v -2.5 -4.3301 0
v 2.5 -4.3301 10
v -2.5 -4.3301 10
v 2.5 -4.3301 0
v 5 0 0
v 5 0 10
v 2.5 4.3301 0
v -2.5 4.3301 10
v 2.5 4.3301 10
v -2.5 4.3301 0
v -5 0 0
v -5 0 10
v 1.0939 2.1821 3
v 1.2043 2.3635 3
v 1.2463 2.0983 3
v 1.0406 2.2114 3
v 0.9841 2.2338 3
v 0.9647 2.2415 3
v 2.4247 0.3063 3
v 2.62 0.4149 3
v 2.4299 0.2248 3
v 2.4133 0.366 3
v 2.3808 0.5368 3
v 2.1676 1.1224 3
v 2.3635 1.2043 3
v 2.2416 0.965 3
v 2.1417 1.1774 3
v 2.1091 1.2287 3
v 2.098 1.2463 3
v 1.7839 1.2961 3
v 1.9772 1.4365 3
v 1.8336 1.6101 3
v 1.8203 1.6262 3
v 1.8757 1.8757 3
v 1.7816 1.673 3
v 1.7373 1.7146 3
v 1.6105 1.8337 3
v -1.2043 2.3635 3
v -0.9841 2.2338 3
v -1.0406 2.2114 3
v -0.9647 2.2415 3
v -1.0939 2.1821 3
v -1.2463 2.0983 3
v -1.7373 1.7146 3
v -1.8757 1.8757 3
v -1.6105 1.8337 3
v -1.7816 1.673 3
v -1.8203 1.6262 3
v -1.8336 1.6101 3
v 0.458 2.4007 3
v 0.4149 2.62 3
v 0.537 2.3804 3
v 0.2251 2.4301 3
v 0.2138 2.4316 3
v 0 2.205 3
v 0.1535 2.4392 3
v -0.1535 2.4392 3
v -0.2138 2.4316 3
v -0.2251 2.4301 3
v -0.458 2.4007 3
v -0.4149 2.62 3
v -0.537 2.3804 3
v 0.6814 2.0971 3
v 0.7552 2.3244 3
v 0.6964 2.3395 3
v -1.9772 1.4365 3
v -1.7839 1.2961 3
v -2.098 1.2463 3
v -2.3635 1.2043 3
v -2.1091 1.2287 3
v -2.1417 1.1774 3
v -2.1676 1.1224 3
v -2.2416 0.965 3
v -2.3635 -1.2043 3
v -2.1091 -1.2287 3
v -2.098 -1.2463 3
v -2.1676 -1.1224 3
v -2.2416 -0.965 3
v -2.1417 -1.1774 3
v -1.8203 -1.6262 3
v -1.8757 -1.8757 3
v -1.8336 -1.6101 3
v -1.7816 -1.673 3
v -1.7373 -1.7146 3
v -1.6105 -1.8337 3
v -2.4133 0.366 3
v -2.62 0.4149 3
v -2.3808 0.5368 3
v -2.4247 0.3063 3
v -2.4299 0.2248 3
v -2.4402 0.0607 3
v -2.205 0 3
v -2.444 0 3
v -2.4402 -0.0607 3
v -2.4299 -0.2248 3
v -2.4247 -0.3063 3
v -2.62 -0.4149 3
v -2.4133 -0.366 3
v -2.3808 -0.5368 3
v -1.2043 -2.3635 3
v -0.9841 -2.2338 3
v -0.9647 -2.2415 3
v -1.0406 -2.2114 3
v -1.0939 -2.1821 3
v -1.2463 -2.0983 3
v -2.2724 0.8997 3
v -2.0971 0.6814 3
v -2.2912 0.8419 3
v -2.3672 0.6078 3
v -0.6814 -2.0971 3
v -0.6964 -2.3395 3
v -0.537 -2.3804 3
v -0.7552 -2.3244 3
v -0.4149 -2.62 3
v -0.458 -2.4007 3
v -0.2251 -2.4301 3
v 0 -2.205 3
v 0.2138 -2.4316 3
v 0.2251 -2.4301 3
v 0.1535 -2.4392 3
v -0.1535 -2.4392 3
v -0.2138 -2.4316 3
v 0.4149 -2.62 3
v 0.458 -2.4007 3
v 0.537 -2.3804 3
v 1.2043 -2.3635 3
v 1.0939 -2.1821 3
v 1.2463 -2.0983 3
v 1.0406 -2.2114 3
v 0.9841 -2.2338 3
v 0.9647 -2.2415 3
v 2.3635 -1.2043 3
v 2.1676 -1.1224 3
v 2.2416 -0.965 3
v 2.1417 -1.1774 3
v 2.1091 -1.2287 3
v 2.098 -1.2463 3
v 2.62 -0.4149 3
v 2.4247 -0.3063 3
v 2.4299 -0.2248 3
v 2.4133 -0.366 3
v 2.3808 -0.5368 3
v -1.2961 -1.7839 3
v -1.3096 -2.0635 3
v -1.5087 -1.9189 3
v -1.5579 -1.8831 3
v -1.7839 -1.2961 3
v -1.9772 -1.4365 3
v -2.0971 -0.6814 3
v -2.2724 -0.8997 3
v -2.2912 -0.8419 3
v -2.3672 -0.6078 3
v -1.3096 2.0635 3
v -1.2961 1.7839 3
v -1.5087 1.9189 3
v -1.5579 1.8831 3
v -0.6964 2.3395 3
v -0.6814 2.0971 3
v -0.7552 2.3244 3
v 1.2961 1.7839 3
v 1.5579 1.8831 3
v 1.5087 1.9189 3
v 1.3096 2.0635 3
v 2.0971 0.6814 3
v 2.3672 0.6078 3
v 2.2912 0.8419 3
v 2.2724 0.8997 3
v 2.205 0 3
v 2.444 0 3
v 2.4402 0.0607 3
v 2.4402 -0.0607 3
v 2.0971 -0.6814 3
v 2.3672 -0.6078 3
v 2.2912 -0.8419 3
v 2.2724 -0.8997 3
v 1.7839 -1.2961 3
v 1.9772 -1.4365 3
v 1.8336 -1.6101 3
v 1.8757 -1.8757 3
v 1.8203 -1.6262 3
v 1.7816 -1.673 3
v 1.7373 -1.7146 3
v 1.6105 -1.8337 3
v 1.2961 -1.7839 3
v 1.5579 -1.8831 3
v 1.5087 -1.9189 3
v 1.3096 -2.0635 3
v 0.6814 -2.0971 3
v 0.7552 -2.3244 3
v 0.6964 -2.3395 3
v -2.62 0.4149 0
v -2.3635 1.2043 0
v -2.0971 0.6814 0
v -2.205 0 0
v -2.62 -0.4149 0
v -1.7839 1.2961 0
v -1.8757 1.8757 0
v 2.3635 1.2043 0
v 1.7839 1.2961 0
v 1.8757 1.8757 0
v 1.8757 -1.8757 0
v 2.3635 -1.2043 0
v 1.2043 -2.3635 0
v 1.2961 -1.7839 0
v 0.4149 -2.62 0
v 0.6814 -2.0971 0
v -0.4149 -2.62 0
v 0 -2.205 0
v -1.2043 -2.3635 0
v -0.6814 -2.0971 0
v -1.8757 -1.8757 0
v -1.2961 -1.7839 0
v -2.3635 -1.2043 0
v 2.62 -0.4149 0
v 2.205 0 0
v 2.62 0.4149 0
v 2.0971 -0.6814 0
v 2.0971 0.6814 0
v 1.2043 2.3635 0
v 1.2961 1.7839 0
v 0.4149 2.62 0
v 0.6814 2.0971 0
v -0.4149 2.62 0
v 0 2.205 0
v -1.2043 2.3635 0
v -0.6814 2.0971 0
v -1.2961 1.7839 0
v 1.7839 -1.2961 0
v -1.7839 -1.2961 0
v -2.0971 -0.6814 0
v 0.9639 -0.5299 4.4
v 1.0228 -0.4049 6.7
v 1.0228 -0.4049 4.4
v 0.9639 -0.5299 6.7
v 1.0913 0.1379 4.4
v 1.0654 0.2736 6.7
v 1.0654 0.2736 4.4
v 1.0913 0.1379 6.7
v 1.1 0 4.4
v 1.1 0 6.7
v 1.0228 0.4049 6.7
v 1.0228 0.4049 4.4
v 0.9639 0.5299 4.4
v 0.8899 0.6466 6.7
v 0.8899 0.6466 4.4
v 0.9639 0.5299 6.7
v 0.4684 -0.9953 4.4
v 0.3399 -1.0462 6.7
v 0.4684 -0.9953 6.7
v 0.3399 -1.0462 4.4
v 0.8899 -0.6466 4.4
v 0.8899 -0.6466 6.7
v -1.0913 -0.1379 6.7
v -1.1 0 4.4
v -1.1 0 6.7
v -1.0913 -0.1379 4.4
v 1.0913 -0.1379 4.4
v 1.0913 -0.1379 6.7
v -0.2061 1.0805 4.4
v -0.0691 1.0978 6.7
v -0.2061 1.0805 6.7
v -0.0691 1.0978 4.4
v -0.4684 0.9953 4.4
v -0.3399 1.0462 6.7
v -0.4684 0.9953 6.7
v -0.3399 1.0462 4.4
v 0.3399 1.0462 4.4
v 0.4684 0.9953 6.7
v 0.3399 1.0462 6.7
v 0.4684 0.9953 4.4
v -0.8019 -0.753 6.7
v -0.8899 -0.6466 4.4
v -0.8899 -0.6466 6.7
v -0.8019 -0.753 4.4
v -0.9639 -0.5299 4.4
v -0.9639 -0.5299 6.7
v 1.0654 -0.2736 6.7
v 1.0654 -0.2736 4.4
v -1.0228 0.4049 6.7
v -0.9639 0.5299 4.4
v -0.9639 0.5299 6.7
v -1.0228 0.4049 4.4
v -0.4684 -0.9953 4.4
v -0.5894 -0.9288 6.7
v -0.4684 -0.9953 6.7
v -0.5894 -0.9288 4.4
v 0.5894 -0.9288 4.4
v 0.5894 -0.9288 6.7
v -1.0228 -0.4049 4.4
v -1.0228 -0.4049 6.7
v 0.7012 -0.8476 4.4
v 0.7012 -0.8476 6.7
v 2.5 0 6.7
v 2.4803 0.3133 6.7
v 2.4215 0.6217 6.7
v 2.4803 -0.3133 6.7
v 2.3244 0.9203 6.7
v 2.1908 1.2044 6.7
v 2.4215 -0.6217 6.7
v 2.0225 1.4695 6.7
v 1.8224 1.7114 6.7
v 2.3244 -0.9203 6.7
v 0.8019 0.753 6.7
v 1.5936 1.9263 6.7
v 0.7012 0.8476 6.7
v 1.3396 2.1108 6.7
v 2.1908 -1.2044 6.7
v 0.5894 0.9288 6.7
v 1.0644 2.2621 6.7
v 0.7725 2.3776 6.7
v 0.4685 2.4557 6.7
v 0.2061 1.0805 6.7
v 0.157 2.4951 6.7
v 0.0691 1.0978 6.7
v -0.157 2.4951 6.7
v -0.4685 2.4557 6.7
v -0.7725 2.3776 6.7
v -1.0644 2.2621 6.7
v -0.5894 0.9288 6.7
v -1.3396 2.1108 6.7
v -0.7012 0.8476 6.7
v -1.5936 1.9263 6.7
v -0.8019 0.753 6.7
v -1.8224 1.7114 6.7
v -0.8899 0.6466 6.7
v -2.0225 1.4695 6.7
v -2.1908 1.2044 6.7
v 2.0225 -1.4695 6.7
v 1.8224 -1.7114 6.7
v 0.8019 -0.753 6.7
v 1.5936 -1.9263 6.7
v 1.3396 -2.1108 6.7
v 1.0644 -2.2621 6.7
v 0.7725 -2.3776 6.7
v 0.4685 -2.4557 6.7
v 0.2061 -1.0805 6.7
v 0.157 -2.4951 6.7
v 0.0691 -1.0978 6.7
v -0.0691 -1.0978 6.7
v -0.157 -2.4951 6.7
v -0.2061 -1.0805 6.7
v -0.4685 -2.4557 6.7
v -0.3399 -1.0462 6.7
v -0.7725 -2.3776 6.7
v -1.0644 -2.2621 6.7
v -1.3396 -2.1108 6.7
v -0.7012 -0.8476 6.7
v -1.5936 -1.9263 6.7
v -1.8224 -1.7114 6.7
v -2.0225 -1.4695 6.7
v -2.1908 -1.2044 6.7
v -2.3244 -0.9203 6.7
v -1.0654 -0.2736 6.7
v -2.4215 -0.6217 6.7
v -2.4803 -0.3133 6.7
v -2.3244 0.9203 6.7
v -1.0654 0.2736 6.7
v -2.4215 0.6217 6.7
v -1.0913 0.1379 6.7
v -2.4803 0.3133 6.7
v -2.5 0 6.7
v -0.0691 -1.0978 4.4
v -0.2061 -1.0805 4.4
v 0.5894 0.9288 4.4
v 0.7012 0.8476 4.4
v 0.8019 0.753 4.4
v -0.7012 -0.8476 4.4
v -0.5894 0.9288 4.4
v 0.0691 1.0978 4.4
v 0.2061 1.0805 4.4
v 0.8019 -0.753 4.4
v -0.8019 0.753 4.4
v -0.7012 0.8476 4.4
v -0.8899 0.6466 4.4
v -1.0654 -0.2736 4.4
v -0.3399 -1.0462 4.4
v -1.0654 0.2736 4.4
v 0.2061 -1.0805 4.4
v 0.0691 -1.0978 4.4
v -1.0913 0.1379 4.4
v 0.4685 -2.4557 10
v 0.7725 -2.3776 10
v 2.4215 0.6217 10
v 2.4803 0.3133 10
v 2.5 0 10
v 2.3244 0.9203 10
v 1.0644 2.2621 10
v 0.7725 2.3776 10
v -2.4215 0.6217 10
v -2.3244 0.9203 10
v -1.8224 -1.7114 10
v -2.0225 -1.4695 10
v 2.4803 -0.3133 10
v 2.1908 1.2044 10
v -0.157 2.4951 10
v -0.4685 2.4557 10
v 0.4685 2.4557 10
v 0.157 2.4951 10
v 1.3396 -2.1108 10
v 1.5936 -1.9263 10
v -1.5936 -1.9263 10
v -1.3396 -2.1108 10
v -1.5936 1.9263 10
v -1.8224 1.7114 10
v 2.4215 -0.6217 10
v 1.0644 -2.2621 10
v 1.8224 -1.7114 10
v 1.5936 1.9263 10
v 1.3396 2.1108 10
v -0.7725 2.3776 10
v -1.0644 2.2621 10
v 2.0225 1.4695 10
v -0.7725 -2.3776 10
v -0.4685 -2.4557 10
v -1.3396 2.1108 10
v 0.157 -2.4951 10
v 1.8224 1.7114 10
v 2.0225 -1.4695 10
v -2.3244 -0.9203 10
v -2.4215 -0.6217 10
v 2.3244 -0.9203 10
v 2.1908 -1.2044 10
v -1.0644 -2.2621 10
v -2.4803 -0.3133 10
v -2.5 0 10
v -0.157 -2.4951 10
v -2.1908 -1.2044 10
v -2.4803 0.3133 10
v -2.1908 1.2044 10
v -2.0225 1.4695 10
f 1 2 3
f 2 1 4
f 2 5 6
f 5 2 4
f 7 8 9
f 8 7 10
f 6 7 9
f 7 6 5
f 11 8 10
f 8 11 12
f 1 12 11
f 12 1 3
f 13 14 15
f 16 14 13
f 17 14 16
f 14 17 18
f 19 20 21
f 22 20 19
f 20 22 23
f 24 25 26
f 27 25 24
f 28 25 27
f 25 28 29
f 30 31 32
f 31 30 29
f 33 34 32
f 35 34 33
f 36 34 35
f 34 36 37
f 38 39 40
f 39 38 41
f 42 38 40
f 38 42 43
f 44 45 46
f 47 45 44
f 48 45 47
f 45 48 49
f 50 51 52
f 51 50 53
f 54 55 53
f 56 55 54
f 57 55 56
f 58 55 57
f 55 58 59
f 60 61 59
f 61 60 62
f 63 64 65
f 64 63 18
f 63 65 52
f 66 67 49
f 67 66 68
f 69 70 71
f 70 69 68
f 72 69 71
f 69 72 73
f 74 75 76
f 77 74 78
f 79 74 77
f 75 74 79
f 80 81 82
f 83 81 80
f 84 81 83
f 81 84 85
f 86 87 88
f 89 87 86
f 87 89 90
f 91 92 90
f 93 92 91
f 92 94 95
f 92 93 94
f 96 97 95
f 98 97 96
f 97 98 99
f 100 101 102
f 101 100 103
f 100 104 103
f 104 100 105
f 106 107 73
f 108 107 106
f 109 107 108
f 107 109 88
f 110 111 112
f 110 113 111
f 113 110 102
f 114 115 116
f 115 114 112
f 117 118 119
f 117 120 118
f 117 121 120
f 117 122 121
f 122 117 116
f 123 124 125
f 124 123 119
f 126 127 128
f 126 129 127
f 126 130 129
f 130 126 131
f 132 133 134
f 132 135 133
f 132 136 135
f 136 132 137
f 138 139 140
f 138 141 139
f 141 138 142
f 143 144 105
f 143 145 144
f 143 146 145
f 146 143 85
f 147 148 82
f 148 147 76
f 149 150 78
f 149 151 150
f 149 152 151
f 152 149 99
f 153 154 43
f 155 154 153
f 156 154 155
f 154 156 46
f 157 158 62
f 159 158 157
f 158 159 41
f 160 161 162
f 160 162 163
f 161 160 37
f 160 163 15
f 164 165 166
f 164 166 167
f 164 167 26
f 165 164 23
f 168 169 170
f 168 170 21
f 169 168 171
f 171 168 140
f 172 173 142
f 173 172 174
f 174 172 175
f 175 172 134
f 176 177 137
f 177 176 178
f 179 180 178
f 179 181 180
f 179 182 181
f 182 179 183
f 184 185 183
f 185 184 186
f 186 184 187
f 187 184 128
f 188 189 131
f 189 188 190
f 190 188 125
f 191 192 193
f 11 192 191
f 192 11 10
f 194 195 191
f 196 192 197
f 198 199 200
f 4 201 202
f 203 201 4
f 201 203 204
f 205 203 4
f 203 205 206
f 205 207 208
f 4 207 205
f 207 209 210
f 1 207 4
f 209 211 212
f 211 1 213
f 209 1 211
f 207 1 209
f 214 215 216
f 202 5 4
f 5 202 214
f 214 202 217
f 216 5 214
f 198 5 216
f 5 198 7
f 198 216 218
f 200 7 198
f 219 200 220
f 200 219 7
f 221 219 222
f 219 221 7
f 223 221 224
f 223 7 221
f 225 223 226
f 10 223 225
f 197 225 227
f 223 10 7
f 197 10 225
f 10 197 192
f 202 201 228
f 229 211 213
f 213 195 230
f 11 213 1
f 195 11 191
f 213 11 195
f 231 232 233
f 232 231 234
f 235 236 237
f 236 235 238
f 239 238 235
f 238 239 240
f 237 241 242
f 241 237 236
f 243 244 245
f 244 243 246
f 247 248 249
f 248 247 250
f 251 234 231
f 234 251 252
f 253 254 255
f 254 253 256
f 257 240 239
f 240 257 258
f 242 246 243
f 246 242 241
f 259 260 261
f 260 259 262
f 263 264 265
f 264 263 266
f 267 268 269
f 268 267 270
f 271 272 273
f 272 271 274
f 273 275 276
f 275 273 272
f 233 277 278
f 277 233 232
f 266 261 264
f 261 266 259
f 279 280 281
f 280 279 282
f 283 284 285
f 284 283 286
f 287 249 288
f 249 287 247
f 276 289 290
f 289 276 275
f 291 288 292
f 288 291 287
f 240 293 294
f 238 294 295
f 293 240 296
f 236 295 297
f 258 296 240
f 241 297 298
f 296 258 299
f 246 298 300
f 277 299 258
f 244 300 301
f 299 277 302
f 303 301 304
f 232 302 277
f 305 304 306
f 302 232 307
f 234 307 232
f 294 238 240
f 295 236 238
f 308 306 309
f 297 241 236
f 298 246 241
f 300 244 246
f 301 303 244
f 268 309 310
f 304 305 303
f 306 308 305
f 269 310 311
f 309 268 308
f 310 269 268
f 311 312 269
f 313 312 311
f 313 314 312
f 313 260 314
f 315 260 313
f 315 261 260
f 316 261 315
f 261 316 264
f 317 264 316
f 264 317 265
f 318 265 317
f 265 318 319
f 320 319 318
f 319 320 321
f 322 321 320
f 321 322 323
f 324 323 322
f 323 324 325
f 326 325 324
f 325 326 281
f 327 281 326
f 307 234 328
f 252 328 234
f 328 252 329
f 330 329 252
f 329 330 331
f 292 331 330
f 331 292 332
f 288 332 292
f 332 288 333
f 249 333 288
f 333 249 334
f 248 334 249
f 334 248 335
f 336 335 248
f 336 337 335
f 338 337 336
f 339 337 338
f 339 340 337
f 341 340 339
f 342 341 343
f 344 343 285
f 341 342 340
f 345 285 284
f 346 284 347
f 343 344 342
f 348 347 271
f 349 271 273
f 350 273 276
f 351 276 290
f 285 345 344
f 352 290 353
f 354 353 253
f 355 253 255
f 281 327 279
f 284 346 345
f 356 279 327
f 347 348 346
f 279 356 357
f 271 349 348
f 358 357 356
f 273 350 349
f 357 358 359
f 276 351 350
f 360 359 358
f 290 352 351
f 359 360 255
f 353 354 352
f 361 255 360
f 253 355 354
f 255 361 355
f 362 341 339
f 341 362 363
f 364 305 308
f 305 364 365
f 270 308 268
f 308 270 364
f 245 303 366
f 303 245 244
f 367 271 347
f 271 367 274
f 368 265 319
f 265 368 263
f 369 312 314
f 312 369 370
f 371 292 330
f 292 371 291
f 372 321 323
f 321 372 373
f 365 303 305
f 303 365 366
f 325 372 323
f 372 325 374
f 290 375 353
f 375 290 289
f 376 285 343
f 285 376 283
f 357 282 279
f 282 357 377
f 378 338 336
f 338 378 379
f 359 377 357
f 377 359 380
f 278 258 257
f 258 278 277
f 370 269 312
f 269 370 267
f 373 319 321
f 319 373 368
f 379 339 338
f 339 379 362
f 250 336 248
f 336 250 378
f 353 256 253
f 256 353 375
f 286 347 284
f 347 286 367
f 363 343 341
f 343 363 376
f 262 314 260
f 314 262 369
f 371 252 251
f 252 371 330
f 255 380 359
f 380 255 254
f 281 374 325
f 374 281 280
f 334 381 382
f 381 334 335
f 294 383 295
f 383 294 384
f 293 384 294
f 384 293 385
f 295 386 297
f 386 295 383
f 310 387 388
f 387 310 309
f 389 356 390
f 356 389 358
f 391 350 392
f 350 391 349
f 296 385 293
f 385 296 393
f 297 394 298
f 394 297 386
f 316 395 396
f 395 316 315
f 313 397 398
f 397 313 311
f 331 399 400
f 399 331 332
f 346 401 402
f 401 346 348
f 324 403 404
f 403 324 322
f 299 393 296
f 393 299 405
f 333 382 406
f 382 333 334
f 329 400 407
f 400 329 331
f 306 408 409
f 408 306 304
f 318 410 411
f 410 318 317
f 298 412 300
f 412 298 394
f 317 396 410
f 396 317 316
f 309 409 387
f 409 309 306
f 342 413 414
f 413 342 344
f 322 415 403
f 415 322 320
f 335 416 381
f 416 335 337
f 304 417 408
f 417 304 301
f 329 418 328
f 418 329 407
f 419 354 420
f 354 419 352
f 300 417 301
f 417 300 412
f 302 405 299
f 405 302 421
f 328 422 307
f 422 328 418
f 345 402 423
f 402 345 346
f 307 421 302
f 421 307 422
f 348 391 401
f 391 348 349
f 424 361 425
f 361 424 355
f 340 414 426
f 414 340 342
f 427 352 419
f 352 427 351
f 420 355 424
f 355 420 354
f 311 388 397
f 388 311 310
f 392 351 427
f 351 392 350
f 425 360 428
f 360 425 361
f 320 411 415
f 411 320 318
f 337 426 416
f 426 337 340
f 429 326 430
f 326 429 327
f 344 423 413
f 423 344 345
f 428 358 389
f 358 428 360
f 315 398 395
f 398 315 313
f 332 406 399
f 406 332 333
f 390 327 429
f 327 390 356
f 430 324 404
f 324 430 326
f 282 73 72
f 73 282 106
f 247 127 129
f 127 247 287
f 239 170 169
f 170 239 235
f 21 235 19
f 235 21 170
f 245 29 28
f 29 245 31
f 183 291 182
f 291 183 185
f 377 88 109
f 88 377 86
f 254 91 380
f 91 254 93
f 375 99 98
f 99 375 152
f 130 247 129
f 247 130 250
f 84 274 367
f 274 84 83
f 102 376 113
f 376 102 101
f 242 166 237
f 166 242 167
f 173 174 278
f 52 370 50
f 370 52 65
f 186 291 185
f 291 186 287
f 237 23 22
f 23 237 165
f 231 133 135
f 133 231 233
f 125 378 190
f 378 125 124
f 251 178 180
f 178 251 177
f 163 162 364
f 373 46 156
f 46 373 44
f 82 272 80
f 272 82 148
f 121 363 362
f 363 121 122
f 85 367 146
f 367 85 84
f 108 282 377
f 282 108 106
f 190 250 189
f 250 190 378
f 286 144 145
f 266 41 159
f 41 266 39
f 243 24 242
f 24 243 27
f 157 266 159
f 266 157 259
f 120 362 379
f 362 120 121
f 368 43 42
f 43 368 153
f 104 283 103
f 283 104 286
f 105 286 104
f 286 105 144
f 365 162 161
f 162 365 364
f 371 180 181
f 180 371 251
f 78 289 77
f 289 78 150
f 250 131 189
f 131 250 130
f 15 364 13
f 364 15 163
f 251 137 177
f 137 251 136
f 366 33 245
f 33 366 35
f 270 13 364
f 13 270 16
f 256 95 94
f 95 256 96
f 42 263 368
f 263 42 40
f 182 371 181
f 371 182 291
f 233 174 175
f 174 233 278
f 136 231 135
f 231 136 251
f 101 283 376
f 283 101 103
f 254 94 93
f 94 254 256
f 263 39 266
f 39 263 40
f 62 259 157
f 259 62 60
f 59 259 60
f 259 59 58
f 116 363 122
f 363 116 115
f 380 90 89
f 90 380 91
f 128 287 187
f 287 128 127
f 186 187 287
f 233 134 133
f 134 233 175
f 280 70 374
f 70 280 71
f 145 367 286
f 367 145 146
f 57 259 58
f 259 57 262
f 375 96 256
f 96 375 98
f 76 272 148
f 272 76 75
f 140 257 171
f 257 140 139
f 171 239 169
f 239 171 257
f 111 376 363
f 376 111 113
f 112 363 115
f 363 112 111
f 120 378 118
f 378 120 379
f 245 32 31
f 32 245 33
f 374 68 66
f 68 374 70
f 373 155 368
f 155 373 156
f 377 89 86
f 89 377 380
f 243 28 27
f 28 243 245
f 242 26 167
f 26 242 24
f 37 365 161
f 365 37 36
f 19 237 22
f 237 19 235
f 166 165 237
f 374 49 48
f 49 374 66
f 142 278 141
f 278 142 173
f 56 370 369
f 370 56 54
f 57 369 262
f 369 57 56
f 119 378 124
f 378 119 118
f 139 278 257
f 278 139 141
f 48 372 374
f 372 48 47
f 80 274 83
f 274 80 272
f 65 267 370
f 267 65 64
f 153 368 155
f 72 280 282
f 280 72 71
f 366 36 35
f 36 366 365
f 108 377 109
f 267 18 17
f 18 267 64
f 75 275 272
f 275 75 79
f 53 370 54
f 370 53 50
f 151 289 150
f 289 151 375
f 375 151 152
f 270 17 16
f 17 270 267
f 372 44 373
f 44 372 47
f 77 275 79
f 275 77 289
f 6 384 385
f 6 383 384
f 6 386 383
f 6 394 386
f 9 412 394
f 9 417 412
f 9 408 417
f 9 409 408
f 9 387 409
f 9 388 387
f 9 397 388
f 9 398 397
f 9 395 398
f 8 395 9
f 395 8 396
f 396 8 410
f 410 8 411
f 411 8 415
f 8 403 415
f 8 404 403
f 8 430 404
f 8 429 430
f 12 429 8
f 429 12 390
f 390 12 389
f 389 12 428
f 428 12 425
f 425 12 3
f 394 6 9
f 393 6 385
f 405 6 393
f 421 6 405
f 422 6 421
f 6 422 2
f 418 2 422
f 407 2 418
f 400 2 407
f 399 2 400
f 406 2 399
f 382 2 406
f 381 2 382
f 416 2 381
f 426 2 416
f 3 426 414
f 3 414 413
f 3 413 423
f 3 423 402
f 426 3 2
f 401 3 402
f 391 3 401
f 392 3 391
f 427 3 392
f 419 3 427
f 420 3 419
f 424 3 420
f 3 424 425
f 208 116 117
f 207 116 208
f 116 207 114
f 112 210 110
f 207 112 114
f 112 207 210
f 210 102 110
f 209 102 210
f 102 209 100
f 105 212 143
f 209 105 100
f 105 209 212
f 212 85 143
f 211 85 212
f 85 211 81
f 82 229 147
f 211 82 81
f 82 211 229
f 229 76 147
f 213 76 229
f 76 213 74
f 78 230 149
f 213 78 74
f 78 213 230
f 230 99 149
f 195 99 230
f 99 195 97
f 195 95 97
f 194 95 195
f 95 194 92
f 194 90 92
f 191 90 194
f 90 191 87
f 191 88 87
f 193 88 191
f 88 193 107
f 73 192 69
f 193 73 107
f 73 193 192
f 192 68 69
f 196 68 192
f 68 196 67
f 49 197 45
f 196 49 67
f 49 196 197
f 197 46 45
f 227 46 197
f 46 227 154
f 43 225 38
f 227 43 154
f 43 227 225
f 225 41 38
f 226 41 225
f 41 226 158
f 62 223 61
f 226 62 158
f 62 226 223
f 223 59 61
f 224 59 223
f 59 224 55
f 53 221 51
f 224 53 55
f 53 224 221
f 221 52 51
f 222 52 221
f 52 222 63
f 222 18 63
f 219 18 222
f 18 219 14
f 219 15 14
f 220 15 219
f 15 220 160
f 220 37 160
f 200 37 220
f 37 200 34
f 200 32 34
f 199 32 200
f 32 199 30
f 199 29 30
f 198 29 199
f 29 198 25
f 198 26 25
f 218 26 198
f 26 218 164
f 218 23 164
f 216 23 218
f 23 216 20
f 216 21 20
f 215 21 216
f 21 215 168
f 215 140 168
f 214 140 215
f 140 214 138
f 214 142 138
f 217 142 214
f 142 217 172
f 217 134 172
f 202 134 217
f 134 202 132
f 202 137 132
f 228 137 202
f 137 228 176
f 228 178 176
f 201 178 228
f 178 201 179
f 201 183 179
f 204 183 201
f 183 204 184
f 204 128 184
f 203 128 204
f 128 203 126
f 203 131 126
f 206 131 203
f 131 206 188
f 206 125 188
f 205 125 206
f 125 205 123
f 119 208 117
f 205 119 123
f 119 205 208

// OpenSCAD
// file: tbhub-core.scad
/*
Copyright (c) 2017 Paul Austin - SDG

Permission is hereby granted, free of charge, to any person obtaining a copy
of this software and associated documentation files (the "Software"), to deal
in the Software without restriction, including without limitation the rights
to use, copy, modify, merge, publish, distribute, sublicense, and/or sell
copies of the Software, and to permit persons to whom the Software is
furnished to do so, subject to the following conditions:

The above copyright notice and this permission notice shall be included in all
copies or substantial portions of the Software.

THE SOFTWARE IS PROVIDED "AS IS", WITHOUT WARRANTY OF ANY KIND, EXPRESS OR
IMPLIED, INCLUDING BUT NOT LIMITED TO THE WARRANTIES OF MERCHANTABILITY,
FITNESS FOR A PARTICULAR PURPOSE AND NONINFRINGEMENT. IN NO EVENT SHALL THE
AUTHORS OR COPYRIGHT HOLDERS BE LIABLE FOR ANY CLAIM, DAMAGES OR OTHER
LIABILITY, WHETHER IN AN ACTION OF CONTRACT, TORT OR OTHERWISE, ARISING FROM,
OUT OF OR IN CONNECTION WITH THE SOFTWARE OR THE USE OR OTHER DEALINGS IN THE
SOFTWARE.
*/

$fn = 50;

module simpleHub(splineCount = 20, h = 4.5, d = 8.5) {
    // Six sides cylinder is a short cut for extruded hexagon. Its also
    // much faster than constructing one from polygons.
    // Use the simple hub to create plug hole for a hub.
    cylinder($fn = 6, d=d, h=h);
}

module coreHub(splineCount = 20, h = 4.5, splineH = 3, splineD=5.0, d = 8.5) {
    
    // Approx spline shaft diameters
    // sg90(subMicro) - 5mm
    // micro          - 6mm
    screwFlangeThickness = 3.7;
    screwHeadDiameter = 5;
    screwShaftDiameter = 2.2;
    coreH= h;
    
    // The main shaft hub
    difference() {
        cylinder($fn = 6, d=d, h=splineH);
        cylinder(d=splineD+0.35, h=splineH);
    }

    // Splines on the inside of the hub
    color("red") linear_extrude(splineH)
    for ( rib = [0:(360/splineCount):360]) {
        // Pivot aroung origin
        rotate([0,0,rib])
        // Move out from origin
        translate([splineD/2+0.2,0,0])
        // Make corner face origin
        rotate([0,0,45])
        // Make a square
        square([0.7,0.7], center = true);
    }
    
    // Hole for the screw
    color("green") difference() {    
        translate([0,0,splineH]) cylinder($fn = 6, d=d,h=(coreH - splineH));
        union() {
            translate([0,0,splineH]) cylinder(d=screwShaftDiameter, h=screwFlangeThickness);
            translate([0,0,splineH+screwFlangeThickness]) cylinder(d=screwHeadDiameter,h=5);
            translate([0,0,1.9]) cylinder(h=2.5, d1 = 7, d2 = screwShaftDiameter);
        }
    }
    
}

rotate([0,0,0]) coreHub(splineCount = 21, coreH = 10, d = 8.4);
// main file
 /*
Copyright (c) 2017 Paul Austin - SDG
Permission is hereby granted, free of charge, to any person obtaining a copy
of this software and associated documentation files (the "Software"), to deal
in the Software without restriction, including without limitation the rights
to use, copy, modify, merge, publish, distribute, sublicense, and/or sell
copies of the Software, and to permit persons to whom the Software is
furnished to do so, subject to the following conditions:
The above copyright notic and this permission notice shall be included in all
copies or substantial portions of the Software.
THE SOFTWARE IS PROVIDED "AS IS", WITHOUT WARRANTY OF ANY KIND, EXPRESS OR
IMPLIED, INCLUDING BUT NOT LIMITED TO THE WARRANTIES OF MERCHANTABILITY,
FITNESS FOR A PARTICULAR PURPOSE AND NONINFRINGEMENT. IN NO EVENT SHALL THE
AUTHORS OR COPYRIGHT HOLDERS BE LIABLE FOR ANY CLAIM, DAMAGES OR OTHER
LIABILITY, WHETHER IN AN ACTION OF CONTRACT, TORT OR OTHERWISE, ARISING FROM,
OUT OF OR IN CONNECTION WITH THE SOFTWARE OR THE USE OR OTHER DEALINGS IN THE
SOFTWARE.
*/

use <tbhub-core.scad>
coreHub(d=10, h=10);
